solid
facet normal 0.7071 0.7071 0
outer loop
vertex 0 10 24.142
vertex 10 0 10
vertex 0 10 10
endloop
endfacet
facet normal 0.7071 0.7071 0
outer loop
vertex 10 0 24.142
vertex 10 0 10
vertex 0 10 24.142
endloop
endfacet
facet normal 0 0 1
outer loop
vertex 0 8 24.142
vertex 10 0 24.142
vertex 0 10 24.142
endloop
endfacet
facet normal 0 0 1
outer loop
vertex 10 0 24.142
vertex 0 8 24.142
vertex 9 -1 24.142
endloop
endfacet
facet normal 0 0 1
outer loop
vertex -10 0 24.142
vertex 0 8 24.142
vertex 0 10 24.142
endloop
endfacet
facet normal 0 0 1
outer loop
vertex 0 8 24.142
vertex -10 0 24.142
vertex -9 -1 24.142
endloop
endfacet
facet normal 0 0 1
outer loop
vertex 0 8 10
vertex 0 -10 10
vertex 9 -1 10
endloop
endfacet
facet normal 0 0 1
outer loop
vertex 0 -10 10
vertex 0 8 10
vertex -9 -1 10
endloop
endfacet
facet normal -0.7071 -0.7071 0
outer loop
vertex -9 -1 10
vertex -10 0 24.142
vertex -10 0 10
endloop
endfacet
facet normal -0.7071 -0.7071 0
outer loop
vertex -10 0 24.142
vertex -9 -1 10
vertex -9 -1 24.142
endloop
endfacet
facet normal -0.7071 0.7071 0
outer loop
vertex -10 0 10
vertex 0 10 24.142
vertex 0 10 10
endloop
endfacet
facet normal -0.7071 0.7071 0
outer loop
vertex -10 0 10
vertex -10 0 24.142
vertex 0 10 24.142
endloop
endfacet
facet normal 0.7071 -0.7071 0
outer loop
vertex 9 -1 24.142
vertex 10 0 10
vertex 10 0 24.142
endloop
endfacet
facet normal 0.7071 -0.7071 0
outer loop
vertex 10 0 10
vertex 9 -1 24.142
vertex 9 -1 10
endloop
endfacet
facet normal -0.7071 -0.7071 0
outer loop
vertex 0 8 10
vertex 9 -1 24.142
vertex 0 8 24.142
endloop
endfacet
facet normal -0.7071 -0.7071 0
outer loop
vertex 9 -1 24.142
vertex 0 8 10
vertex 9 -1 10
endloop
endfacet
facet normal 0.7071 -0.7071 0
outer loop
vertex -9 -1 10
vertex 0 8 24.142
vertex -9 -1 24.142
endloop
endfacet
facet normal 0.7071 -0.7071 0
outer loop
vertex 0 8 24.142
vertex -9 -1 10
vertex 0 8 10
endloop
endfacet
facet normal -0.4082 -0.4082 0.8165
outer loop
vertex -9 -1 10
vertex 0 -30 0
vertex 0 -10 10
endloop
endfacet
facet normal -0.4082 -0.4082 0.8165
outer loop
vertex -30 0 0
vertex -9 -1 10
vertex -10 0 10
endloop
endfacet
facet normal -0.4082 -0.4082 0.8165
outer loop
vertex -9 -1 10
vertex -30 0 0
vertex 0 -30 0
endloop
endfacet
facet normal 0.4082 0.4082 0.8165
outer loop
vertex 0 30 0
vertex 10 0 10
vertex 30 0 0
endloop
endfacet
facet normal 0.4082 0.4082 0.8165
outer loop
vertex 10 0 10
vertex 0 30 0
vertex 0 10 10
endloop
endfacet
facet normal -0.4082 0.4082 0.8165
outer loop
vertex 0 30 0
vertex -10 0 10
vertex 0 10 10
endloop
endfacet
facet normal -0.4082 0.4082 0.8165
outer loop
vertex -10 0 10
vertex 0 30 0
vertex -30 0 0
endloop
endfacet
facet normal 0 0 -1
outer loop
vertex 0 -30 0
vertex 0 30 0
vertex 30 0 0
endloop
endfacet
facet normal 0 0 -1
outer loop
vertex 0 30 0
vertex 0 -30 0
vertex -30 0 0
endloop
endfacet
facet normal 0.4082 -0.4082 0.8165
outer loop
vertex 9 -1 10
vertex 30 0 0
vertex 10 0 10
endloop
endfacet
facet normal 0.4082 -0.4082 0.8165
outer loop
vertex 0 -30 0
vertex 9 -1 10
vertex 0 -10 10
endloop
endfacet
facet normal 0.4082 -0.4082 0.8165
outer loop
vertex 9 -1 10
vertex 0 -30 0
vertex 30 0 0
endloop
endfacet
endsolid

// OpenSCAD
cylinder(r1=30, r2=10, h=10, $fn=4);
rotate([0, 0, 45]) {
	translate([-5 * sqrt(2), -5 * sqrt(2), 10]) {
		difference() {
			cube(sqrt(2) * 10);
			cube([sqrt(2) * 9, sqrt(2) * 9, sqrt(2) * 10]);
		}
	}
}
